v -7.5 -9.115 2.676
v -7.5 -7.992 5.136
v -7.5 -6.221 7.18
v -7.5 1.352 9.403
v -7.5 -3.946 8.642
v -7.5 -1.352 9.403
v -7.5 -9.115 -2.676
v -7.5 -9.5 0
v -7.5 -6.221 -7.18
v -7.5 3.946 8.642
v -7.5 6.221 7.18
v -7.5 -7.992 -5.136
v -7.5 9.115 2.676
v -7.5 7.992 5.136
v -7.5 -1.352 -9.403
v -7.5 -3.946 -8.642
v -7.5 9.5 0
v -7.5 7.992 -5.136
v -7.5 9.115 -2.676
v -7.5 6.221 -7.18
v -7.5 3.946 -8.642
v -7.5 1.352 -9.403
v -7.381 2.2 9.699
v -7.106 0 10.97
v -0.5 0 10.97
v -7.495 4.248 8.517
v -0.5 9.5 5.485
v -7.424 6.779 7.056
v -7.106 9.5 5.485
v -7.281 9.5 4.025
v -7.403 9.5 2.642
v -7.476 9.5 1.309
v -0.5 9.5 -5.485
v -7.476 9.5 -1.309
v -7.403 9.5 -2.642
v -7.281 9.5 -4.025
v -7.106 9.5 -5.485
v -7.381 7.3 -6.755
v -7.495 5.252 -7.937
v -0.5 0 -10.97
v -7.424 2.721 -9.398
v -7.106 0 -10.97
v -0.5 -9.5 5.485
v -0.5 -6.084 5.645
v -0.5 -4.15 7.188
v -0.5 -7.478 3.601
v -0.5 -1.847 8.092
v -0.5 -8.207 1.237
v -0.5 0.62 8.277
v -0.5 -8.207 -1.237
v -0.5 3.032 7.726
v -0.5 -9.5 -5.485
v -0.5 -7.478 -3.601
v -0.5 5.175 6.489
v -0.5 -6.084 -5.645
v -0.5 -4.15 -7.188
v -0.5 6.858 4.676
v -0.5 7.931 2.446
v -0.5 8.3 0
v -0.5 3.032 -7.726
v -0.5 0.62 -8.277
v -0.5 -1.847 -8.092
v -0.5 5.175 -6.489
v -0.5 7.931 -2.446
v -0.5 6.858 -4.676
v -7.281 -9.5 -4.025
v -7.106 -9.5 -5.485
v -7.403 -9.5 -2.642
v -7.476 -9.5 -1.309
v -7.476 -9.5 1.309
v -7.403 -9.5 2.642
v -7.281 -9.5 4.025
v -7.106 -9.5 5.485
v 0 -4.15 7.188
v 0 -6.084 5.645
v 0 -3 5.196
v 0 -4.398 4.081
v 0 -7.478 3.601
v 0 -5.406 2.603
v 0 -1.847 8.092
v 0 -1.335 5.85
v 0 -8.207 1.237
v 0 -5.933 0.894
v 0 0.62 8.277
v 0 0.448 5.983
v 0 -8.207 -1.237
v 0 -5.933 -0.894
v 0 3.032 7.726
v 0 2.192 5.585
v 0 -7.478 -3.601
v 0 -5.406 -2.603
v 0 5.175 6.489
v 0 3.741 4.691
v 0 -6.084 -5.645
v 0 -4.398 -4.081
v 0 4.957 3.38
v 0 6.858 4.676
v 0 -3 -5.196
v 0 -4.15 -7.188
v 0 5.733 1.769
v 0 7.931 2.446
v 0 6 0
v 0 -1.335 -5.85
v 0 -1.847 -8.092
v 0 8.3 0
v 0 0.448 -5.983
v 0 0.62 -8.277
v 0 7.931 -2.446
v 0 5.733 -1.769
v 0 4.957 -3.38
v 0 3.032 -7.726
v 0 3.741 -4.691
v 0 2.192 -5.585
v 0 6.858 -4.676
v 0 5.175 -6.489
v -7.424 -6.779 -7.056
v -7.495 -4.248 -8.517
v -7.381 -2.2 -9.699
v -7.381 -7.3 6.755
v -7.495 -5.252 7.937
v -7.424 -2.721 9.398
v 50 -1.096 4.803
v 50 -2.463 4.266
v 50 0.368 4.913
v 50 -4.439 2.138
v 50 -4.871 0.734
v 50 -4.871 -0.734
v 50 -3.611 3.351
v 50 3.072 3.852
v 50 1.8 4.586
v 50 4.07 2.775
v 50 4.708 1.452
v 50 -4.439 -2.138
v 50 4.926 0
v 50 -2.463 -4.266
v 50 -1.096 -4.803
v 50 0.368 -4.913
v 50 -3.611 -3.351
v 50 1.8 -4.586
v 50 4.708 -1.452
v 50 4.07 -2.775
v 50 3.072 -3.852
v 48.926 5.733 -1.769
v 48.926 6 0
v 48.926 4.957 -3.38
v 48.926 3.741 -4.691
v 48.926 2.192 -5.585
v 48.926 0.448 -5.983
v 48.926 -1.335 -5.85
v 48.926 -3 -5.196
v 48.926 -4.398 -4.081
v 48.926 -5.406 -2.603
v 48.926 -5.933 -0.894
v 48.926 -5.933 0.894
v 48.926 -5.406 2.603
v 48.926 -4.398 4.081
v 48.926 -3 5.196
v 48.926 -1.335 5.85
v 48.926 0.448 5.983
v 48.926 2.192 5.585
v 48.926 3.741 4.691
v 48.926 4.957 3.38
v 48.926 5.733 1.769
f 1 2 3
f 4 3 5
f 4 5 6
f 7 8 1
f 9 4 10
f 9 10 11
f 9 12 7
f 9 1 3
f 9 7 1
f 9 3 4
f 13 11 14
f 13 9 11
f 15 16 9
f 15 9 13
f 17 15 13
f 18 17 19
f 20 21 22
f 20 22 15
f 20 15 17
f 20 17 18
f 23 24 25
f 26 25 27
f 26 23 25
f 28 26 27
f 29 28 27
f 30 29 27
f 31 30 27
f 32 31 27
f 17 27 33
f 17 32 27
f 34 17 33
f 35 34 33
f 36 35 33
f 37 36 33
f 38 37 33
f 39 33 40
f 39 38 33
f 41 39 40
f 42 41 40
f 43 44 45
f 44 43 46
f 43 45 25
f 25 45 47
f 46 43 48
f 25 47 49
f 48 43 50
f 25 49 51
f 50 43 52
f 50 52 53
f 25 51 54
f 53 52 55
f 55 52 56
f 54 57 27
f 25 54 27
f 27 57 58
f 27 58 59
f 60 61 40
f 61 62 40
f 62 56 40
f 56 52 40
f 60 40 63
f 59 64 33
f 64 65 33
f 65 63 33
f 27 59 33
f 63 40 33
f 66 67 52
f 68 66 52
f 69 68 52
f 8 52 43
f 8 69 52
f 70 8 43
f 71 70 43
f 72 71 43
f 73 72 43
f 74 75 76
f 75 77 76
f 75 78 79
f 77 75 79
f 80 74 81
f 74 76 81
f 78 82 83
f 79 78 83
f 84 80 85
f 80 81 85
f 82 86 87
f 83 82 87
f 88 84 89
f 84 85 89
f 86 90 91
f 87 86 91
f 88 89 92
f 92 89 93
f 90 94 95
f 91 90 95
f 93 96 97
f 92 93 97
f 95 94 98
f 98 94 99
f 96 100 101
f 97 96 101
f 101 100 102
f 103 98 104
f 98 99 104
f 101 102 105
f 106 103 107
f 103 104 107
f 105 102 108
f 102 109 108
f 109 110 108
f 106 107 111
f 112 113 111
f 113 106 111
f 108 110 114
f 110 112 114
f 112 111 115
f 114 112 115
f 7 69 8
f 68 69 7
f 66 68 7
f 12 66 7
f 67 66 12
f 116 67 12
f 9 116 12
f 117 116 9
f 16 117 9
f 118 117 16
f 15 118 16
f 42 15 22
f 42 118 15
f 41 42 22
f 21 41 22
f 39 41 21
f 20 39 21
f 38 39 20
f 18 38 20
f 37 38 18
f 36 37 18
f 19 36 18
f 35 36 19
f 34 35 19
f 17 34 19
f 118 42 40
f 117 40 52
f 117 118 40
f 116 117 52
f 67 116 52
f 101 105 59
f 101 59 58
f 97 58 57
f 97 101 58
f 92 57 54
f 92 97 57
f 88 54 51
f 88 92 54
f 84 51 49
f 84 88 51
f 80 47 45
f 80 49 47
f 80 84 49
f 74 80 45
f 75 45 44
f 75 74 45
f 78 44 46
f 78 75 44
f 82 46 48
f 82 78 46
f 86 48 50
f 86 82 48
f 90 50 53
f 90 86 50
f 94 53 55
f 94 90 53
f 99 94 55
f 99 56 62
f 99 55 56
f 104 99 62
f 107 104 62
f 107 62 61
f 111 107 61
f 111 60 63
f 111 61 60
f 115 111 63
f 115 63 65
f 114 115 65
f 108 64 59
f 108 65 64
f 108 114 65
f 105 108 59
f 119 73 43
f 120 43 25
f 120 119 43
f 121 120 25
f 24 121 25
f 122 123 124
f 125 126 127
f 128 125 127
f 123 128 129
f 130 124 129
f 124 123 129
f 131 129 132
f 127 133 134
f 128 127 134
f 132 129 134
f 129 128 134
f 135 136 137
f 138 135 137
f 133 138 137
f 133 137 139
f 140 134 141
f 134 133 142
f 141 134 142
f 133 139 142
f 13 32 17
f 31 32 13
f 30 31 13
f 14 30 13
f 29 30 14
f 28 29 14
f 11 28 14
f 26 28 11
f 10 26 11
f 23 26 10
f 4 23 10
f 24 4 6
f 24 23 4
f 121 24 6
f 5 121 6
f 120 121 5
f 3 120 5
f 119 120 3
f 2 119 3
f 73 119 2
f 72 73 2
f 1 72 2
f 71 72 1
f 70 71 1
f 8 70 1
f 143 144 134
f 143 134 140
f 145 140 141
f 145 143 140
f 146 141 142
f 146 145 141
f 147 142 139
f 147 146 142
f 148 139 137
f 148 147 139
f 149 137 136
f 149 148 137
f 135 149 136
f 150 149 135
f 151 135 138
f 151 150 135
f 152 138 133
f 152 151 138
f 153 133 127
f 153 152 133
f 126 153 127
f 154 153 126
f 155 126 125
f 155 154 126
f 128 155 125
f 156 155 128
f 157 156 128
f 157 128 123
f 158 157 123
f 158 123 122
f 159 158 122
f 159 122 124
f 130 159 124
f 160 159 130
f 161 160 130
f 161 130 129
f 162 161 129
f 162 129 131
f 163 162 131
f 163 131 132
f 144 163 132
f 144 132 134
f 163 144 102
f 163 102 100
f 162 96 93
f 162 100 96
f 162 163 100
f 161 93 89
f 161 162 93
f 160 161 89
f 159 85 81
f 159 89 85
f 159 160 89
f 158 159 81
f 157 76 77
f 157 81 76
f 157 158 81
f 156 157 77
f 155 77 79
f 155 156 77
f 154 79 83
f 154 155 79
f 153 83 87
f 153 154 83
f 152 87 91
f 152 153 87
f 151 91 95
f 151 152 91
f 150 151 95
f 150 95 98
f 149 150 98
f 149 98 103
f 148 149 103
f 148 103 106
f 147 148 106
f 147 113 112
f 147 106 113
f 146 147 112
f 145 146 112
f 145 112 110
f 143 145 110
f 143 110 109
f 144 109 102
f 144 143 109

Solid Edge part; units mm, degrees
sketch "Sketch1" plane through (0, 0, 0) normal (0, 0, 1) x (1, 0, 0)
  line L0 (-7.5, 0) -> (-7.5, 9.5)
  line L1 (-7.5, 9.5) -> (-6.6828, 12.55)
  line L2 (-6.6828, 12.55) -> (-0.5, 12.55)
  line L3 (-0.5, 12.55) -> (-0.5, 8.3)
  line L4 (-0.5, 8.3) -> (0, 8.3)
  line L5 (0, 8.3) -> (0, 6)
  line L6 (0, 6) -> (48.9265, 6)
  line L7 (48.9265, 6) -> (50, 4.9265)
  line L8 (50, 4.9265) -> (50, 0)
  line L9 (50, 0) -> (-7.5, 0)
revolve "RevolvedProtrusion1" add sketch "Sketch1" angle 360 about axis through (50, 0, 0) along (-1, 0, 0)
cosmetic_thread "Thread1" size "M12"
sketch "Sketch2" plane through (-7.5, 0, 0) normal (-1, 0, 0) x (0, -1, 0)
  circle A0 centre (0, 0) radius 14.55
  line L0 (9.5, 5.4848) -> (0, 10.9697)
  line L1 (0, 10.9697) -> (-9.5, 5.4848)
  line L2 (-9.5, 5.4848) -> (-9.5, -5.4848)
  line L3 (-9.5, -5.4848) -> (0, -10.9697)
  line L4 (0, -10.9697) -> (9.5, -5.4848)
  line L5 (9.5, -5.4848) -> (9.5, 5.4848)
extrude "ExtrudedCutout_1" cut sketch "Sketch2" against normal blind 7.5
properties part number "07171-12X50"
